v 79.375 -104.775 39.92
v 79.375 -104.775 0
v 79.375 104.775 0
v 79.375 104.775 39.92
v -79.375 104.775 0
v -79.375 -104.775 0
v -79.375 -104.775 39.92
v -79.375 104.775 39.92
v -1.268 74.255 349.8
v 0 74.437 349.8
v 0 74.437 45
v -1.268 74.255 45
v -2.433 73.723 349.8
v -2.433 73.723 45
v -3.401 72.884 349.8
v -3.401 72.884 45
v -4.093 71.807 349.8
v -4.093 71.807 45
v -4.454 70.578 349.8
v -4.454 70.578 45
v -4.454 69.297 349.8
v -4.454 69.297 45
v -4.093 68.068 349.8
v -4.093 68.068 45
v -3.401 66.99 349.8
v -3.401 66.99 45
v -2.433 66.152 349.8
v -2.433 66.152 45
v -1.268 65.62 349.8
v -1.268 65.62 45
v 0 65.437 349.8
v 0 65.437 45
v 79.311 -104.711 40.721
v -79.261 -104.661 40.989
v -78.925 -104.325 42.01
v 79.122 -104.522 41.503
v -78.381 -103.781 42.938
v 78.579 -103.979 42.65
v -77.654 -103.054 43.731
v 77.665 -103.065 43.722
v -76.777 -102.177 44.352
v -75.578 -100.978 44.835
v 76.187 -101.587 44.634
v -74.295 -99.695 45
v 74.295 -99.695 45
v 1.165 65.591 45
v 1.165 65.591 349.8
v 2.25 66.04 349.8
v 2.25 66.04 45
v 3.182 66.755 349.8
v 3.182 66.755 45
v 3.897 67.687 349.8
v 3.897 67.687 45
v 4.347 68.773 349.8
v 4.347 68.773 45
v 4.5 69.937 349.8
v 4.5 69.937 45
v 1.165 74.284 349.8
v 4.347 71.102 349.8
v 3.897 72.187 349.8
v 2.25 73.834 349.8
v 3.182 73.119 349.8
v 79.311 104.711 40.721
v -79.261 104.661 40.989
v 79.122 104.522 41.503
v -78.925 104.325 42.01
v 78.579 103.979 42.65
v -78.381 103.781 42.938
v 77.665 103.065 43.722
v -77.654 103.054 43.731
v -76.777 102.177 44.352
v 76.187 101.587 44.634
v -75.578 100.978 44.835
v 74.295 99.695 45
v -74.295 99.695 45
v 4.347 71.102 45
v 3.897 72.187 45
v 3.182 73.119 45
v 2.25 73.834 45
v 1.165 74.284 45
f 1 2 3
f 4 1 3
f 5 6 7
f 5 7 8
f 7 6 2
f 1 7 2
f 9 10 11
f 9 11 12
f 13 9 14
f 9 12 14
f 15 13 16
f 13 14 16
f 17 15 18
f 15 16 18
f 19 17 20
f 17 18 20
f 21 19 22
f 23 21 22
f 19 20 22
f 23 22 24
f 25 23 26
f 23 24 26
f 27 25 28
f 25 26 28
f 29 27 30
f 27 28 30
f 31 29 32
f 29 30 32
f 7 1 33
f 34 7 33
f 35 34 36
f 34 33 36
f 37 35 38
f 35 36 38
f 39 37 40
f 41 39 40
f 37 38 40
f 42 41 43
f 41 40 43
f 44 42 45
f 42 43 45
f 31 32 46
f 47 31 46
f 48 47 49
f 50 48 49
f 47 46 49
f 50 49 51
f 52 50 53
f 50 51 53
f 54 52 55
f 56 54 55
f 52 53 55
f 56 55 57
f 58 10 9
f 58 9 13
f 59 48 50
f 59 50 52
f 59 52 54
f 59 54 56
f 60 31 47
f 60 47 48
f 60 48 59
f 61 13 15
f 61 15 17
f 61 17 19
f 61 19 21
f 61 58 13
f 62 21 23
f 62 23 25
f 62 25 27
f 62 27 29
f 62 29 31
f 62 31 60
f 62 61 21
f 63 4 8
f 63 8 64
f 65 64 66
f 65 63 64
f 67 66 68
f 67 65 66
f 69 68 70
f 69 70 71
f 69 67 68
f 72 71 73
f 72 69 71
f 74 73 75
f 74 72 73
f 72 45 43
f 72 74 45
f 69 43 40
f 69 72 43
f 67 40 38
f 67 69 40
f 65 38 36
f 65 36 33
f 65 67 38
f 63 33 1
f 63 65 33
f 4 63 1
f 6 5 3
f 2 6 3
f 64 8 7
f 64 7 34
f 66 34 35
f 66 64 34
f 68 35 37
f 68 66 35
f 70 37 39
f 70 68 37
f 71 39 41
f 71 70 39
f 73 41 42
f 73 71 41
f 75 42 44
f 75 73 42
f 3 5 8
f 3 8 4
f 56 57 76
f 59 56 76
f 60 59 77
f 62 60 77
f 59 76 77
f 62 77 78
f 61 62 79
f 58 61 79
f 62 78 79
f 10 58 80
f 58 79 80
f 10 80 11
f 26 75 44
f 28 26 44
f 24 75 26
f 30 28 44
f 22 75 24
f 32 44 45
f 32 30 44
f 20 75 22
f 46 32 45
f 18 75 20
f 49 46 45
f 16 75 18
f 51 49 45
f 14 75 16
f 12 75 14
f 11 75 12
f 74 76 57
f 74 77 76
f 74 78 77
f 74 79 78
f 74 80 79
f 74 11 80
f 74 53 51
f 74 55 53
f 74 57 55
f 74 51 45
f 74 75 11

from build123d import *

# Parameters (mm, degrees)
F0_W     = 158.75
F0_H     = 209.55
F1_DEPTH = 45
F3_DEPTH = 304.8
F4_R     = 5.08


with BuildPart() as f1:
    # F0 (on Top) → F1 (new body)
    with BuildSketch(Plane.XY):
        Rectangle(F0_W, F0_H)
    extrude(amount=F1_DEPTH)

    # F2 (on face) → F3 (join)
    with BuildSketch(Plane.XY.offset(45)):
        with BuildLine():
            Line((0, 69.9373111129), (0, 74.4373111129))
            ThreePointArc((0, 74.4373111129), (-4.5, 69.9373111129), (0, 65.4373111129))
            Line((0, 65.4373111129), (0, 69.9373111129))
        make_face()
        with BuildLine():
            ThreePointArc((4.5, 69.9373111129), (3.1819805153, 73.1192916282), (0, 74.4373111129))
            Line((0, 74.4373111129), (0, 69.9373111129))
            Line((0, 69.9373111129), (0, 65.4373111129))
            ThreePointArc((0, 65.4373111129), (3.1819805153, 66.7553305975), (4.5, 69.9373111129))
        make_face()
    extrude(amount=F3_DEPTH)

    # F4
    f4_edges = [f1.edges().sort_by_distance(p)[0] for p in [
        (79.375, 0, 45),
        (0, -104.775, 45),
        (-79.375, 0, 45),
        (0, 104.775, 45),
    ]]
    fillet(f4_edges, radius=F4_R)


solid = f1.part
